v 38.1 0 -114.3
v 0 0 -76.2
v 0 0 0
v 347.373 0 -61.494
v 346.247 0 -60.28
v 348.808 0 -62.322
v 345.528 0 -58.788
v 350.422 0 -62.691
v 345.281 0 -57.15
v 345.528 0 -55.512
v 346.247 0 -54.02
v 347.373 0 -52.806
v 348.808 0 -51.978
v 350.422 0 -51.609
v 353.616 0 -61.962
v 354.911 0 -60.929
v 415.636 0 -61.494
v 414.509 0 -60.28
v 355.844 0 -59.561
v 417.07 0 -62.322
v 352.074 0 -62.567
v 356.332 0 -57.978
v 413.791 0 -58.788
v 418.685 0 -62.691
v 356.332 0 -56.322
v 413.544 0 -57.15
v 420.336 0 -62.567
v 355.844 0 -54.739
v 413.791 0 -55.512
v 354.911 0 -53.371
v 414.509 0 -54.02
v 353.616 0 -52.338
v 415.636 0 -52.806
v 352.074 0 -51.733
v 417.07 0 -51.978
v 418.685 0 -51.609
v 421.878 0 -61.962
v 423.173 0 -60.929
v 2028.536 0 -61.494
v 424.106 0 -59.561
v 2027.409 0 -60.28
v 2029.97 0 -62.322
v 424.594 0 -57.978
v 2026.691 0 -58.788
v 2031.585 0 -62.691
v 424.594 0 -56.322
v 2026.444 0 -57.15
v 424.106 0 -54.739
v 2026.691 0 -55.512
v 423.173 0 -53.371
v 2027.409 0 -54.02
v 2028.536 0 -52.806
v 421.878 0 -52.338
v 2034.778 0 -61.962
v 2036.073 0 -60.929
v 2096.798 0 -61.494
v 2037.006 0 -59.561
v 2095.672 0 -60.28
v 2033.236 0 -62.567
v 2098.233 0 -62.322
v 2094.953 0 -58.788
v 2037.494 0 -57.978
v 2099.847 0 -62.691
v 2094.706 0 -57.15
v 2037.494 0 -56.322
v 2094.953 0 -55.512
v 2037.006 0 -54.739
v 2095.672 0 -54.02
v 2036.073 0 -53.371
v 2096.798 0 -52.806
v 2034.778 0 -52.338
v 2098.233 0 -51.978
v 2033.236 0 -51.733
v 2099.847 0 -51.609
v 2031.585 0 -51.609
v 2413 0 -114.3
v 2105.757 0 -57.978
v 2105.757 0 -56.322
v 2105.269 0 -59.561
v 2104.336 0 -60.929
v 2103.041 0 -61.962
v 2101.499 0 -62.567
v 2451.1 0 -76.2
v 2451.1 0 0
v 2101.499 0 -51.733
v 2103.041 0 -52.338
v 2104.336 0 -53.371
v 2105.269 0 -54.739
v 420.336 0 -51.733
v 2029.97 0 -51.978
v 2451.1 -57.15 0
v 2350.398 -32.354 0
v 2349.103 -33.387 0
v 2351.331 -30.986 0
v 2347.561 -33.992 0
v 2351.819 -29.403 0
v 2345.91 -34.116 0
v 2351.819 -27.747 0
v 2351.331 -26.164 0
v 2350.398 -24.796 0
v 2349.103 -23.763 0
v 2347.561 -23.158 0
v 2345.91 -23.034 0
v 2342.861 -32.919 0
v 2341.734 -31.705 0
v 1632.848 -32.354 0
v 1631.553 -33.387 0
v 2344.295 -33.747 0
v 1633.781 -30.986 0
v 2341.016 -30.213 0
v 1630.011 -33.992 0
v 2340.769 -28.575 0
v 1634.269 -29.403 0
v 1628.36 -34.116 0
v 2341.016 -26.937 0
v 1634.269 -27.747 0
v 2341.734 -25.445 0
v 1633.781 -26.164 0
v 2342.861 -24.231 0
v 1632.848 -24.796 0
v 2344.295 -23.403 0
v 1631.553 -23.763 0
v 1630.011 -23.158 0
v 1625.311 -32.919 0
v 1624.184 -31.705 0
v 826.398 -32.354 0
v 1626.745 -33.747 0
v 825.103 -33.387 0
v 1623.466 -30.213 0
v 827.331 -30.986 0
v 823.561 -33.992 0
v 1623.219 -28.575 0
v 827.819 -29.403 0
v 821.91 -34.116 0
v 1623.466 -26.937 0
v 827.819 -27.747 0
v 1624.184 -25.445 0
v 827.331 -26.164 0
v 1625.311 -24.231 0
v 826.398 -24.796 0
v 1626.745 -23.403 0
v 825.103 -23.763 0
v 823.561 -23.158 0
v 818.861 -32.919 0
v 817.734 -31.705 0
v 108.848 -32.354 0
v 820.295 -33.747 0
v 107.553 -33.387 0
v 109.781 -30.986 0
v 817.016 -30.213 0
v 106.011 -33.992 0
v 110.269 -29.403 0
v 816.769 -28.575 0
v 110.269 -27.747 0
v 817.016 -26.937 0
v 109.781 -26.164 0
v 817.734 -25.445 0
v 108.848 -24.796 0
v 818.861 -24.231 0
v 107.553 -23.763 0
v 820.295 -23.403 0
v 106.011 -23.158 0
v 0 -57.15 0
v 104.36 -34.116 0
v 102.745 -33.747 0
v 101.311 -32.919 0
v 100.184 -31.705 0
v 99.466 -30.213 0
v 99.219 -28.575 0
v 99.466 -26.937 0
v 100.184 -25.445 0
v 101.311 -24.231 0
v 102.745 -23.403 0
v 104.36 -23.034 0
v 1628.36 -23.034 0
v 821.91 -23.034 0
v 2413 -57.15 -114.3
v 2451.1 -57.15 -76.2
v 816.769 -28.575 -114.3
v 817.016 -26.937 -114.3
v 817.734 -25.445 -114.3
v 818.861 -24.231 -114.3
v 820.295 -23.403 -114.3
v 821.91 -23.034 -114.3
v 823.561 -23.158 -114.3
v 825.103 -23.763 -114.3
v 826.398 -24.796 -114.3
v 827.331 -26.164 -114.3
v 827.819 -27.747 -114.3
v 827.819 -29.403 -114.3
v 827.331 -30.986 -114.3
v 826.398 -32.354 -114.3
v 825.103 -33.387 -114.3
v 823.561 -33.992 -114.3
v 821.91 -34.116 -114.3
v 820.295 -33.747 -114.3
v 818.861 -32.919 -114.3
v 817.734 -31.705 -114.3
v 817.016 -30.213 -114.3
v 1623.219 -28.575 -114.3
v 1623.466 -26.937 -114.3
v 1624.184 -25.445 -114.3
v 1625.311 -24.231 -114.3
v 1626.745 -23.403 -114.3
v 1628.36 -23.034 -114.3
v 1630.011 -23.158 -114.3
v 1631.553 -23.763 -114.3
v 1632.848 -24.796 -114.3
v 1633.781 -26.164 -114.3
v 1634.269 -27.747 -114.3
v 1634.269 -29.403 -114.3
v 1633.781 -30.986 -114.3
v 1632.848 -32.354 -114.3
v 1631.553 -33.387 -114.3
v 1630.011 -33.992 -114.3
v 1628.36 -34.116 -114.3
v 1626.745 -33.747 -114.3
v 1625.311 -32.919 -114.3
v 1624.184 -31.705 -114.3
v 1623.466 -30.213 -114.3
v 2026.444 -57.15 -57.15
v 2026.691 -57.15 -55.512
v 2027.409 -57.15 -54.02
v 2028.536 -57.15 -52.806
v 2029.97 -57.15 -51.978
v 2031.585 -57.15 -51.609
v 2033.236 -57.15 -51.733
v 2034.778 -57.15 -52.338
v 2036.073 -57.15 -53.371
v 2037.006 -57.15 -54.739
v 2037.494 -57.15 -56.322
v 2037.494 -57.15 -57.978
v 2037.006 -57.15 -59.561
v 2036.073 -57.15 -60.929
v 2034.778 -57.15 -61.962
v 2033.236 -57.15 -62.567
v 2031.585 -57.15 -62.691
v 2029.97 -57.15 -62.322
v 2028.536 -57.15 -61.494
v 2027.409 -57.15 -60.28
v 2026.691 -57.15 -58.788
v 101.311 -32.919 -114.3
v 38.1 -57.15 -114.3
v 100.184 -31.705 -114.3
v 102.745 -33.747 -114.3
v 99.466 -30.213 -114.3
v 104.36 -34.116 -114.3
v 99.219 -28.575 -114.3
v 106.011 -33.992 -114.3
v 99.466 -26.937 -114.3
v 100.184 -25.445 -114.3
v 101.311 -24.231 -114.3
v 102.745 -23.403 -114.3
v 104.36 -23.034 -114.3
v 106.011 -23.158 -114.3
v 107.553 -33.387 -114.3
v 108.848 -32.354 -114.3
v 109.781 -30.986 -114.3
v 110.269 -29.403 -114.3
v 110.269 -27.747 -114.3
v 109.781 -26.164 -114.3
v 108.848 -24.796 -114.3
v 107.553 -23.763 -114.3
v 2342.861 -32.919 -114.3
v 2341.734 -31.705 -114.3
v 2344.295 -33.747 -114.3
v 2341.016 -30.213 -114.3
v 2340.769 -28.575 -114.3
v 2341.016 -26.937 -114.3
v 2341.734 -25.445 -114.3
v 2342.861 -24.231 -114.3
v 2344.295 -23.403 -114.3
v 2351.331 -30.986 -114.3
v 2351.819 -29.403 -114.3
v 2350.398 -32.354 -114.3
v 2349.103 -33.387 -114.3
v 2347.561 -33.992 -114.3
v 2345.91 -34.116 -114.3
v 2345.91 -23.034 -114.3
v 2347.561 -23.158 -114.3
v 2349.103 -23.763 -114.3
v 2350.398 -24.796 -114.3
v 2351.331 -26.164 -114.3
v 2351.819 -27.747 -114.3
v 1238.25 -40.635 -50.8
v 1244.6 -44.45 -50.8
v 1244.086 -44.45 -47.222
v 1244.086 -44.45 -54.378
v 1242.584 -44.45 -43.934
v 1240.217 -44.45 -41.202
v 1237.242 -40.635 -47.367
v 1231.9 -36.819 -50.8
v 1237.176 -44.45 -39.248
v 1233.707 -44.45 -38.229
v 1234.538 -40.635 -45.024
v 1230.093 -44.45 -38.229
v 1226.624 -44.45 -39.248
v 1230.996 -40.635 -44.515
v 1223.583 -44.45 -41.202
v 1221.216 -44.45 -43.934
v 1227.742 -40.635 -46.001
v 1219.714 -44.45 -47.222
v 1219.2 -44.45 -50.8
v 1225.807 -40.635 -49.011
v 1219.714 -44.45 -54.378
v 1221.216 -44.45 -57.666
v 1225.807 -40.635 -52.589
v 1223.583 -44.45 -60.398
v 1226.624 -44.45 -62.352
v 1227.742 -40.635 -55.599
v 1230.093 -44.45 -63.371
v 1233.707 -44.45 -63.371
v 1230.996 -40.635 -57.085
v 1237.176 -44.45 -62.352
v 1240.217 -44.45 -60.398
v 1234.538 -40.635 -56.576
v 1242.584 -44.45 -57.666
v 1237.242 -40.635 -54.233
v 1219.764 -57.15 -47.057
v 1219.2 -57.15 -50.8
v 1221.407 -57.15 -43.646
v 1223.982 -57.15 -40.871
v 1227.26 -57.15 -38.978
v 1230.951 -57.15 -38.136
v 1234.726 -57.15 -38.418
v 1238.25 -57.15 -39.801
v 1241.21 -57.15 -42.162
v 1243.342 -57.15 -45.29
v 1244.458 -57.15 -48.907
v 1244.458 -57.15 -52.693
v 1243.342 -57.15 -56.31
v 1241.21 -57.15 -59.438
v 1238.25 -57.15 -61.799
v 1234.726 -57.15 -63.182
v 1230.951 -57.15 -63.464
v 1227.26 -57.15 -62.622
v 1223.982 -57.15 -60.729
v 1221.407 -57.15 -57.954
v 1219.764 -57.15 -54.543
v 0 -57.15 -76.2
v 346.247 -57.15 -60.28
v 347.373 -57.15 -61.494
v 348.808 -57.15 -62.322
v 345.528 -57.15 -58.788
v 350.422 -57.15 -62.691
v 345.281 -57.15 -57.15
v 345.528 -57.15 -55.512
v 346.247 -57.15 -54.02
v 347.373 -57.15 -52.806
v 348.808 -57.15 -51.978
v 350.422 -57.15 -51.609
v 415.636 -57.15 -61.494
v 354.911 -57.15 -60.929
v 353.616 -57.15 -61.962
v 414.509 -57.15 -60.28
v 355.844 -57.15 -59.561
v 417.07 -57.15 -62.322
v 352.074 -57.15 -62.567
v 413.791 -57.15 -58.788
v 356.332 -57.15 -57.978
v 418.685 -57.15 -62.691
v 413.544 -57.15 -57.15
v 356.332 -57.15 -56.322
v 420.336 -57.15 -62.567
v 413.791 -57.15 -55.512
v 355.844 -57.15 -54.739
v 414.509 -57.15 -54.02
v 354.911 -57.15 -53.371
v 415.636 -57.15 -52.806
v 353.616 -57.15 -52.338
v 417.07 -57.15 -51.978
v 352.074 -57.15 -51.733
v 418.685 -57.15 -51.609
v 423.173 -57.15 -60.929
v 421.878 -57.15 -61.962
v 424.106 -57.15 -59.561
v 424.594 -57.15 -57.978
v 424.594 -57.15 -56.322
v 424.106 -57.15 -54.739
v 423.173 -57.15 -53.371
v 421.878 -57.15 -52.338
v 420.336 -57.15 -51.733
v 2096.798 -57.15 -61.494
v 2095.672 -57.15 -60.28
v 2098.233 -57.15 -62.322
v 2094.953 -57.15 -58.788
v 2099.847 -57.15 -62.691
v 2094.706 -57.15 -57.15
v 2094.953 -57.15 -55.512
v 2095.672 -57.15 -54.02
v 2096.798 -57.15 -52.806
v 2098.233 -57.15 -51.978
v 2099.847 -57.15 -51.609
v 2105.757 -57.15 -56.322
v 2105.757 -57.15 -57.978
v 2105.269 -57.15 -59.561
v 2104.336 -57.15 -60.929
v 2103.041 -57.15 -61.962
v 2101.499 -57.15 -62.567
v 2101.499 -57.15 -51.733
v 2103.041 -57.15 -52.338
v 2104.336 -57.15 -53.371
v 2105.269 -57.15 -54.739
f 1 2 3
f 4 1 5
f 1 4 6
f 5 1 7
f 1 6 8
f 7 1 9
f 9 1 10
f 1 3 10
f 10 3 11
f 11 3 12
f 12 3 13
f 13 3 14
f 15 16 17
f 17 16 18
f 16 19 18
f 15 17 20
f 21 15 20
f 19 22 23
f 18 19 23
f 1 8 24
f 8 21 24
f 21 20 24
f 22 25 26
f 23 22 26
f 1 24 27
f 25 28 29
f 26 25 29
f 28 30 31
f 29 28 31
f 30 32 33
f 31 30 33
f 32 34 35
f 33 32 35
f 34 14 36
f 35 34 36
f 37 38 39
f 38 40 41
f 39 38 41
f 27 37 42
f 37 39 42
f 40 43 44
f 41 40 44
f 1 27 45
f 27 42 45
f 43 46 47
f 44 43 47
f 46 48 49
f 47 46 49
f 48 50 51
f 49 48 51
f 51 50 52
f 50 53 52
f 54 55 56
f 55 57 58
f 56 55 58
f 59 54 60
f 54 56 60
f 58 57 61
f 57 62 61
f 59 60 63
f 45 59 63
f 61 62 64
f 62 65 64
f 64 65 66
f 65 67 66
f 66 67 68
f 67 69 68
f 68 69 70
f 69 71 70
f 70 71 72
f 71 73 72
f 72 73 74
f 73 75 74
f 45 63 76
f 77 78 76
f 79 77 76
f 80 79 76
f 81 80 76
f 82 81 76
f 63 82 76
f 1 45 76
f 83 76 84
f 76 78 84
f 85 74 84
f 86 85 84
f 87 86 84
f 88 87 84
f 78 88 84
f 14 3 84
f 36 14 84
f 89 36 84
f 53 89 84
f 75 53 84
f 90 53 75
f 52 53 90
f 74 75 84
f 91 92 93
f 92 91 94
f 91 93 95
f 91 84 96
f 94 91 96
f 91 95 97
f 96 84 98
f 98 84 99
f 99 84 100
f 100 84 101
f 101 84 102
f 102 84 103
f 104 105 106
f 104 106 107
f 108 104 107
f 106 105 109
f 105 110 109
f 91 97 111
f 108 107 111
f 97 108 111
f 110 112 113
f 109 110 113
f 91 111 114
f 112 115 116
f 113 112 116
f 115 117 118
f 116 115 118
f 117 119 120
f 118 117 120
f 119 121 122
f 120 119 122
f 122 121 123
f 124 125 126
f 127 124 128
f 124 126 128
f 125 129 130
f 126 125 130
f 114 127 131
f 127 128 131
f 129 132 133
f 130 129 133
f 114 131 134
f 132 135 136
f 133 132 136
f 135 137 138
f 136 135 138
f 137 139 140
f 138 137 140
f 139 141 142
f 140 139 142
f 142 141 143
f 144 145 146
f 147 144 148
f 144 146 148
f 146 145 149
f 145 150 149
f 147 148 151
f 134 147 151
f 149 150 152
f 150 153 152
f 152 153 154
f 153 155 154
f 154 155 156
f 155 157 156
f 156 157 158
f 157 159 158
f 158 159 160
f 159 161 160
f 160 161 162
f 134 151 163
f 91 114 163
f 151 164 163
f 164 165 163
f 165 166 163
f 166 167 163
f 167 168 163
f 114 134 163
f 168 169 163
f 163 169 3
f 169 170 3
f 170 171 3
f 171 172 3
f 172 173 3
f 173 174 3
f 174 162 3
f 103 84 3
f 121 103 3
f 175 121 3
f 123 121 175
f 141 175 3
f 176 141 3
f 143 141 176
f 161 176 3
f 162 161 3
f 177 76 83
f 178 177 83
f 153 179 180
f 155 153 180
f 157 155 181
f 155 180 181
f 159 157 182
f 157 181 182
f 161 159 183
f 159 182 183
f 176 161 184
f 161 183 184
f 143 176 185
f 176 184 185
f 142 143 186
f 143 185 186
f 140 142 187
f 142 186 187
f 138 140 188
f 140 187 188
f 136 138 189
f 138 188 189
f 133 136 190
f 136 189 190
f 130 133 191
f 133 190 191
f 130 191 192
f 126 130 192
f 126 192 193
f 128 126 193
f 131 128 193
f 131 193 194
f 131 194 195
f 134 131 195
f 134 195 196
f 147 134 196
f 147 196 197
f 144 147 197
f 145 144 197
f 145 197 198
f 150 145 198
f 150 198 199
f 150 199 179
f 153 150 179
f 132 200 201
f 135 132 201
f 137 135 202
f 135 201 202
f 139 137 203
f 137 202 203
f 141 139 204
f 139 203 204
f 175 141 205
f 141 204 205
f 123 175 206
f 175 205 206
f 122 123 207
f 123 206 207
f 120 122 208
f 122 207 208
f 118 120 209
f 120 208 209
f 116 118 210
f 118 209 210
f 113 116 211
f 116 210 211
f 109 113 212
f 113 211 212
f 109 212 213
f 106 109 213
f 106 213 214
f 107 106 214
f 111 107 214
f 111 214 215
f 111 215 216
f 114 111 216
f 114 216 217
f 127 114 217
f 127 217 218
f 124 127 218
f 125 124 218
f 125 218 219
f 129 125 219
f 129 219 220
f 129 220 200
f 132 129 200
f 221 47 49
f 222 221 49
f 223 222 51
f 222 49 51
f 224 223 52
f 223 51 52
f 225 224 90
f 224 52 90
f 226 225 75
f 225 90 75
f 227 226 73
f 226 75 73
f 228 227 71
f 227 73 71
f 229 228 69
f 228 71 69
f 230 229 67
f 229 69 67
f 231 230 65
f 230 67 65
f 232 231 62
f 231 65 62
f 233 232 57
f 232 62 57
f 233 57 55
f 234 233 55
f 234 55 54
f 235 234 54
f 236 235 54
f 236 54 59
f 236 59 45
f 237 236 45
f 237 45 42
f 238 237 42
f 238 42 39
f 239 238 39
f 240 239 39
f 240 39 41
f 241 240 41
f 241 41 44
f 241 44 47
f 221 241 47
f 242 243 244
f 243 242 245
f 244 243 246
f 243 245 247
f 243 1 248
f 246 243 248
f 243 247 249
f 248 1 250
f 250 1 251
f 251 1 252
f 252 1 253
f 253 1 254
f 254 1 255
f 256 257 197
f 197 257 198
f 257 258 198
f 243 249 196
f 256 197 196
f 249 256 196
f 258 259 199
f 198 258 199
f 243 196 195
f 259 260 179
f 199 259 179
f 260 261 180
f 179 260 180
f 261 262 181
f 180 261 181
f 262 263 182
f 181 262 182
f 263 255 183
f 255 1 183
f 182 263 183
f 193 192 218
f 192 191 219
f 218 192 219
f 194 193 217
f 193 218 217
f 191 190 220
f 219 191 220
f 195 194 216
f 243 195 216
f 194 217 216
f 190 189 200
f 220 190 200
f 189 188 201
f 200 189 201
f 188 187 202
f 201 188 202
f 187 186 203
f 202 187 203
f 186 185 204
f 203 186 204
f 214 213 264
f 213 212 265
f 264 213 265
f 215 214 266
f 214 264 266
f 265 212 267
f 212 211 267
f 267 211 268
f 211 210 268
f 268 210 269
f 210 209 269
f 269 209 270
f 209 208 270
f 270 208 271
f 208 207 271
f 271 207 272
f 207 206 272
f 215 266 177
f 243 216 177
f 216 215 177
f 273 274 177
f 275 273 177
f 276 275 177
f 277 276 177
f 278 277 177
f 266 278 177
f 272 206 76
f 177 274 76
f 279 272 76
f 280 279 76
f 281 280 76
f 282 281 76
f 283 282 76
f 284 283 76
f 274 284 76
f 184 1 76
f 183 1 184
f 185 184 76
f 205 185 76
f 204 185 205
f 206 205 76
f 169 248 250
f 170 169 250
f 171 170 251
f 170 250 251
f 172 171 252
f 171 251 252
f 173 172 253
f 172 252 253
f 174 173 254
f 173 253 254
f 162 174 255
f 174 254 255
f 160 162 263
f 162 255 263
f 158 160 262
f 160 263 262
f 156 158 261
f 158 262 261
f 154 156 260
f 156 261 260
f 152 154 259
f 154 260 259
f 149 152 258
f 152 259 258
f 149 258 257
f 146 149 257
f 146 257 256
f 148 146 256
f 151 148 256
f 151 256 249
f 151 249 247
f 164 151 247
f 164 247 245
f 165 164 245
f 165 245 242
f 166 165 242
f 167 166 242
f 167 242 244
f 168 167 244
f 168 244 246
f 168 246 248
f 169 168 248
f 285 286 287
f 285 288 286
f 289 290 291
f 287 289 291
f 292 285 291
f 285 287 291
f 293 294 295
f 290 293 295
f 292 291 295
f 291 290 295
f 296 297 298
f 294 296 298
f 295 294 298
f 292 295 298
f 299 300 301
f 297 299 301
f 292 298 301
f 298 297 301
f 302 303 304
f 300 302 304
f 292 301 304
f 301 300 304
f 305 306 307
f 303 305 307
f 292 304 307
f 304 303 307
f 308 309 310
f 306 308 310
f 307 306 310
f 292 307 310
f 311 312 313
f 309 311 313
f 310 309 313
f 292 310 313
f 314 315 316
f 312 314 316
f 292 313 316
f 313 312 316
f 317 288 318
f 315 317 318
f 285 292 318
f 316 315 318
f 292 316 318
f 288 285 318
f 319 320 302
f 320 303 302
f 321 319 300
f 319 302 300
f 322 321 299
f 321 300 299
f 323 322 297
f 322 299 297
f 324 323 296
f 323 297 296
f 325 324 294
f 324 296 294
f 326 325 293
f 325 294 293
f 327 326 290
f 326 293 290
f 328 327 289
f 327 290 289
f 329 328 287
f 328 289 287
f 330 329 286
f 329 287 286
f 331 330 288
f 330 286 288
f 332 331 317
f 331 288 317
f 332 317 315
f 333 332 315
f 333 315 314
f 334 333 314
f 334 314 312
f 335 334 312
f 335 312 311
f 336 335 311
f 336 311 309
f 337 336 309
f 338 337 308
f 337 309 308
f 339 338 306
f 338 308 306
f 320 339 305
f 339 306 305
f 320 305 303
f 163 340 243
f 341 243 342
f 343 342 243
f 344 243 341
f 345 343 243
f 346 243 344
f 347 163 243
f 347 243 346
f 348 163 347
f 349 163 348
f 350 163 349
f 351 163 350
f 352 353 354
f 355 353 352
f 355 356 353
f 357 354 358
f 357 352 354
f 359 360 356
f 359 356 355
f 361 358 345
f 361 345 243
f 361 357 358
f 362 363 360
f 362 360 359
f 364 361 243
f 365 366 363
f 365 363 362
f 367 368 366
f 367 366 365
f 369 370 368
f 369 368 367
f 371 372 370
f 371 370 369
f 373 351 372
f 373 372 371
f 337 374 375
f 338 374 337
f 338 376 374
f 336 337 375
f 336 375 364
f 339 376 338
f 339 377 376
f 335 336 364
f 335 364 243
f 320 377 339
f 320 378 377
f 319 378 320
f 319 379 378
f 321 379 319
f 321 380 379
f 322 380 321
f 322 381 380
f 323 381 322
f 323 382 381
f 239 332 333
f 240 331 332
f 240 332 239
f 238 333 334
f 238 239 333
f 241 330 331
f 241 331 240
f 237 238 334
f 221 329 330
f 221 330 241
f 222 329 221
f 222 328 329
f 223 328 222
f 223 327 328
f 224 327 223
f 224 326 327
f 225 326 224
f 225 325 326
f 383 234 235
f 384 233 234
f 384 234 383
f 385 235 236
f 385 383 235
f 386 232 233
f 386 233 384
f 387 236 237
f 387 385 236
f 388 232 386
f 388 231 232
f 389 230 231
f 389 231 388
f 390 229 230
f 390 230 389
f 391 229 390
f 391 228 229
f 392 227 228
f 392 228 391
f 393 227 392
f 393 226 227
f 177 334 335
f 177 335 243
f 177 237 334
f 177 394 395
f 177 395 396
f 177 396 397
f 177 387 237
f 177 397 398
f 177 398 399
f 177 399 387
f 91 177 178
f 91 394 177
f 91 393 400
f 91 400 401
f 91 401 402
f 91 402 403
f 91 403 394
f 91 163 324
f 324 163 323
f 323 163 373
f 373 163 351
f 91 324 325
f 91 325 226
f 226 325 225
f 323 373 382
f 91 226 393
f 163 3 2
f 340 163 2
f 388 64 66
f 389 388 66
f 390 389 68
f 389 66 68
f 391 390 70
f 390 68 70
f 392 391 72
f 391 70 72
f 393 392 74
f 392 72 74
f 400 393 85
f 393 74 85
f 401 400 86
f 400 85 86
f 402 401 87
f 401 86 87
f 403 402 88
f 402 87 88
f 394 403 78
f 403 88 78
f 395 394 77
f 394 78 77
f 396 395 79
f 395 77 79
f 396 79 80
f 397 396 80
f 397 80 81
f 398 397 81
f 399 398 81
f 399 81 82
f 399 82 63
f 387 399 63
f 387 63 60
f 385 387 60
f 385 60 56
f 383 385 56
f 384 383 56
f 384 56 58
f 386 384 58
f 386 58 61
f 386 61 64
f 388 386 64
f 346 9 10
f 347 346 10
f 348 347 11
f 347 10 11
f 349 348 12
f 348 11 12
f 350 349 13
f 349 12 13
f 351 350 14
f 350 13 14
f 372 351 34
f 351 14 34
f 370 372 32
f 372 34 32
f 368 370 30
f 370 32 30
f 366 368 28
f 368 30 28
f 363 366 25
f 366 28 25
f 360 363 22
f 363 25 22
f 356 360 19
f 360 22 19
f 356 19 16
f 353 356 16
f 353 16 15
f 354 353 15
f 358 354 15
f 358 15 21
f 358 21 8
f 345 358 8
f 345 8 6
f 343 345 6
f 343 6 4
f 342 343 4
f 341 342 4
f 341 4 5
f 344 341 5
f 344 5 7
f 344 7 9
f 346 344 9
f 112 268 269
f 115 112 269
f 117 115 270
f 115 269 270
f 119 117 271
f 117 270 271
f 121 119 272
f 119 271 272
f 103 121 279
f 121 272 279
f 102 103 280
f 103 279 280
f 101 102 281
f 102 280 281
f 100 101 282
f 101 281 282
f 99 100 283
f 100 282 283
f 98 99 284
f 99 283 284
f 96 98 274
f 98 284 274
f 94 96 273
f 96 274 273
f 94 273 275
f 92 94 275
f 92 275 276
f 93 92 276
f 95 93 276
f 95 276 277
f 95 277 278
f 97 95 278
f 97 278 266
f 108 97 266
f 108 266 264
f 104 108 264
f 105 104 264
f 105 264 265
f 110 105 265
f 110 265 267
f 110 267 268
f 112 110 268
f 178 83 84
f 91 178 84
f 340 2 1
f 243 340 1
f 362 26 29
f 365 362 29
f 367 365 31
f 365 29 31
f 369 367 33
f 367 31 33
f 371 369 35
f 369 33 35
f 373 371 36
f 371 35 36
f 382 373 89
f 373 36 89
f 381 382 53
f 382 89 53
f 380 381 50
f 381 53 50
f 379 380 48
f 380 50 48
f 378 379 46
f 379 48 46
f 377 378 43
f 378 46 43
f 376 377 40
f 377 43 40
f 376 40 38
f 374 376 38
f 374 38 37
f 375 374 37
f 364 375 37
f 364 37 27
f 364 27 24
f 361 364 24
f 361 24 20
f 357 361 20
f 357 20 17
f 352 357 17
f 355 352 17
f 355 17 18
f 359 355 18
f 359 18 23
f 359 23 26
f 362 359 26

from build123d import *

# Parameters (mm, degrees)
F1_DEPTH = 57.15
F3_D     = 11.1125
F5_D     = 11.1125
F7_D     = 25.4
F7_DEPTH = 12.7
F7_TIP   = 7.6309298617


with BuildPart() as f1:
    # F0 (on Front) → F1 (new body)
    with BuildSketch(Plane.XZ):
        Polygon((2451.1, 0), (0, 0), (0, -76.2), (38.1, -114.3), (2413, -114.3), (2451.1, -76.2), align=None)
    extrude(amount=F1_DEPTH)

    # F3 (through all)
    with Locations(Plane.XY):
        with Locations((104.775, -28.575), (822.325, -28.575), (1628.775, -28.575), (2346.325, -28.575)):
            Hole(F3_D / 2)

    # F5 (through all)
    with Locations(Plane.XZ.offset(57.15)):
        with Locations((350.8375, -57.15), (419.1, -57.15), (2032, -57.15), (2100.2625, -57.15)):
            Hole(F5_D / 2)

    # F7
    with Locations(Plane.XZ.offset(57.15)):
        with Locations((1231.9, -50.8)):
            Hole(F7_D / 2, depth=F7_DEPTH)
            with Locations((0, 0, -(F7_DEPTH + F7_TIP / 2))):  # 118° drill point
                Cone(0, F7_D / 2, F7_TIP, mode=Mode.SUBTRACT)


solid = f1.part
